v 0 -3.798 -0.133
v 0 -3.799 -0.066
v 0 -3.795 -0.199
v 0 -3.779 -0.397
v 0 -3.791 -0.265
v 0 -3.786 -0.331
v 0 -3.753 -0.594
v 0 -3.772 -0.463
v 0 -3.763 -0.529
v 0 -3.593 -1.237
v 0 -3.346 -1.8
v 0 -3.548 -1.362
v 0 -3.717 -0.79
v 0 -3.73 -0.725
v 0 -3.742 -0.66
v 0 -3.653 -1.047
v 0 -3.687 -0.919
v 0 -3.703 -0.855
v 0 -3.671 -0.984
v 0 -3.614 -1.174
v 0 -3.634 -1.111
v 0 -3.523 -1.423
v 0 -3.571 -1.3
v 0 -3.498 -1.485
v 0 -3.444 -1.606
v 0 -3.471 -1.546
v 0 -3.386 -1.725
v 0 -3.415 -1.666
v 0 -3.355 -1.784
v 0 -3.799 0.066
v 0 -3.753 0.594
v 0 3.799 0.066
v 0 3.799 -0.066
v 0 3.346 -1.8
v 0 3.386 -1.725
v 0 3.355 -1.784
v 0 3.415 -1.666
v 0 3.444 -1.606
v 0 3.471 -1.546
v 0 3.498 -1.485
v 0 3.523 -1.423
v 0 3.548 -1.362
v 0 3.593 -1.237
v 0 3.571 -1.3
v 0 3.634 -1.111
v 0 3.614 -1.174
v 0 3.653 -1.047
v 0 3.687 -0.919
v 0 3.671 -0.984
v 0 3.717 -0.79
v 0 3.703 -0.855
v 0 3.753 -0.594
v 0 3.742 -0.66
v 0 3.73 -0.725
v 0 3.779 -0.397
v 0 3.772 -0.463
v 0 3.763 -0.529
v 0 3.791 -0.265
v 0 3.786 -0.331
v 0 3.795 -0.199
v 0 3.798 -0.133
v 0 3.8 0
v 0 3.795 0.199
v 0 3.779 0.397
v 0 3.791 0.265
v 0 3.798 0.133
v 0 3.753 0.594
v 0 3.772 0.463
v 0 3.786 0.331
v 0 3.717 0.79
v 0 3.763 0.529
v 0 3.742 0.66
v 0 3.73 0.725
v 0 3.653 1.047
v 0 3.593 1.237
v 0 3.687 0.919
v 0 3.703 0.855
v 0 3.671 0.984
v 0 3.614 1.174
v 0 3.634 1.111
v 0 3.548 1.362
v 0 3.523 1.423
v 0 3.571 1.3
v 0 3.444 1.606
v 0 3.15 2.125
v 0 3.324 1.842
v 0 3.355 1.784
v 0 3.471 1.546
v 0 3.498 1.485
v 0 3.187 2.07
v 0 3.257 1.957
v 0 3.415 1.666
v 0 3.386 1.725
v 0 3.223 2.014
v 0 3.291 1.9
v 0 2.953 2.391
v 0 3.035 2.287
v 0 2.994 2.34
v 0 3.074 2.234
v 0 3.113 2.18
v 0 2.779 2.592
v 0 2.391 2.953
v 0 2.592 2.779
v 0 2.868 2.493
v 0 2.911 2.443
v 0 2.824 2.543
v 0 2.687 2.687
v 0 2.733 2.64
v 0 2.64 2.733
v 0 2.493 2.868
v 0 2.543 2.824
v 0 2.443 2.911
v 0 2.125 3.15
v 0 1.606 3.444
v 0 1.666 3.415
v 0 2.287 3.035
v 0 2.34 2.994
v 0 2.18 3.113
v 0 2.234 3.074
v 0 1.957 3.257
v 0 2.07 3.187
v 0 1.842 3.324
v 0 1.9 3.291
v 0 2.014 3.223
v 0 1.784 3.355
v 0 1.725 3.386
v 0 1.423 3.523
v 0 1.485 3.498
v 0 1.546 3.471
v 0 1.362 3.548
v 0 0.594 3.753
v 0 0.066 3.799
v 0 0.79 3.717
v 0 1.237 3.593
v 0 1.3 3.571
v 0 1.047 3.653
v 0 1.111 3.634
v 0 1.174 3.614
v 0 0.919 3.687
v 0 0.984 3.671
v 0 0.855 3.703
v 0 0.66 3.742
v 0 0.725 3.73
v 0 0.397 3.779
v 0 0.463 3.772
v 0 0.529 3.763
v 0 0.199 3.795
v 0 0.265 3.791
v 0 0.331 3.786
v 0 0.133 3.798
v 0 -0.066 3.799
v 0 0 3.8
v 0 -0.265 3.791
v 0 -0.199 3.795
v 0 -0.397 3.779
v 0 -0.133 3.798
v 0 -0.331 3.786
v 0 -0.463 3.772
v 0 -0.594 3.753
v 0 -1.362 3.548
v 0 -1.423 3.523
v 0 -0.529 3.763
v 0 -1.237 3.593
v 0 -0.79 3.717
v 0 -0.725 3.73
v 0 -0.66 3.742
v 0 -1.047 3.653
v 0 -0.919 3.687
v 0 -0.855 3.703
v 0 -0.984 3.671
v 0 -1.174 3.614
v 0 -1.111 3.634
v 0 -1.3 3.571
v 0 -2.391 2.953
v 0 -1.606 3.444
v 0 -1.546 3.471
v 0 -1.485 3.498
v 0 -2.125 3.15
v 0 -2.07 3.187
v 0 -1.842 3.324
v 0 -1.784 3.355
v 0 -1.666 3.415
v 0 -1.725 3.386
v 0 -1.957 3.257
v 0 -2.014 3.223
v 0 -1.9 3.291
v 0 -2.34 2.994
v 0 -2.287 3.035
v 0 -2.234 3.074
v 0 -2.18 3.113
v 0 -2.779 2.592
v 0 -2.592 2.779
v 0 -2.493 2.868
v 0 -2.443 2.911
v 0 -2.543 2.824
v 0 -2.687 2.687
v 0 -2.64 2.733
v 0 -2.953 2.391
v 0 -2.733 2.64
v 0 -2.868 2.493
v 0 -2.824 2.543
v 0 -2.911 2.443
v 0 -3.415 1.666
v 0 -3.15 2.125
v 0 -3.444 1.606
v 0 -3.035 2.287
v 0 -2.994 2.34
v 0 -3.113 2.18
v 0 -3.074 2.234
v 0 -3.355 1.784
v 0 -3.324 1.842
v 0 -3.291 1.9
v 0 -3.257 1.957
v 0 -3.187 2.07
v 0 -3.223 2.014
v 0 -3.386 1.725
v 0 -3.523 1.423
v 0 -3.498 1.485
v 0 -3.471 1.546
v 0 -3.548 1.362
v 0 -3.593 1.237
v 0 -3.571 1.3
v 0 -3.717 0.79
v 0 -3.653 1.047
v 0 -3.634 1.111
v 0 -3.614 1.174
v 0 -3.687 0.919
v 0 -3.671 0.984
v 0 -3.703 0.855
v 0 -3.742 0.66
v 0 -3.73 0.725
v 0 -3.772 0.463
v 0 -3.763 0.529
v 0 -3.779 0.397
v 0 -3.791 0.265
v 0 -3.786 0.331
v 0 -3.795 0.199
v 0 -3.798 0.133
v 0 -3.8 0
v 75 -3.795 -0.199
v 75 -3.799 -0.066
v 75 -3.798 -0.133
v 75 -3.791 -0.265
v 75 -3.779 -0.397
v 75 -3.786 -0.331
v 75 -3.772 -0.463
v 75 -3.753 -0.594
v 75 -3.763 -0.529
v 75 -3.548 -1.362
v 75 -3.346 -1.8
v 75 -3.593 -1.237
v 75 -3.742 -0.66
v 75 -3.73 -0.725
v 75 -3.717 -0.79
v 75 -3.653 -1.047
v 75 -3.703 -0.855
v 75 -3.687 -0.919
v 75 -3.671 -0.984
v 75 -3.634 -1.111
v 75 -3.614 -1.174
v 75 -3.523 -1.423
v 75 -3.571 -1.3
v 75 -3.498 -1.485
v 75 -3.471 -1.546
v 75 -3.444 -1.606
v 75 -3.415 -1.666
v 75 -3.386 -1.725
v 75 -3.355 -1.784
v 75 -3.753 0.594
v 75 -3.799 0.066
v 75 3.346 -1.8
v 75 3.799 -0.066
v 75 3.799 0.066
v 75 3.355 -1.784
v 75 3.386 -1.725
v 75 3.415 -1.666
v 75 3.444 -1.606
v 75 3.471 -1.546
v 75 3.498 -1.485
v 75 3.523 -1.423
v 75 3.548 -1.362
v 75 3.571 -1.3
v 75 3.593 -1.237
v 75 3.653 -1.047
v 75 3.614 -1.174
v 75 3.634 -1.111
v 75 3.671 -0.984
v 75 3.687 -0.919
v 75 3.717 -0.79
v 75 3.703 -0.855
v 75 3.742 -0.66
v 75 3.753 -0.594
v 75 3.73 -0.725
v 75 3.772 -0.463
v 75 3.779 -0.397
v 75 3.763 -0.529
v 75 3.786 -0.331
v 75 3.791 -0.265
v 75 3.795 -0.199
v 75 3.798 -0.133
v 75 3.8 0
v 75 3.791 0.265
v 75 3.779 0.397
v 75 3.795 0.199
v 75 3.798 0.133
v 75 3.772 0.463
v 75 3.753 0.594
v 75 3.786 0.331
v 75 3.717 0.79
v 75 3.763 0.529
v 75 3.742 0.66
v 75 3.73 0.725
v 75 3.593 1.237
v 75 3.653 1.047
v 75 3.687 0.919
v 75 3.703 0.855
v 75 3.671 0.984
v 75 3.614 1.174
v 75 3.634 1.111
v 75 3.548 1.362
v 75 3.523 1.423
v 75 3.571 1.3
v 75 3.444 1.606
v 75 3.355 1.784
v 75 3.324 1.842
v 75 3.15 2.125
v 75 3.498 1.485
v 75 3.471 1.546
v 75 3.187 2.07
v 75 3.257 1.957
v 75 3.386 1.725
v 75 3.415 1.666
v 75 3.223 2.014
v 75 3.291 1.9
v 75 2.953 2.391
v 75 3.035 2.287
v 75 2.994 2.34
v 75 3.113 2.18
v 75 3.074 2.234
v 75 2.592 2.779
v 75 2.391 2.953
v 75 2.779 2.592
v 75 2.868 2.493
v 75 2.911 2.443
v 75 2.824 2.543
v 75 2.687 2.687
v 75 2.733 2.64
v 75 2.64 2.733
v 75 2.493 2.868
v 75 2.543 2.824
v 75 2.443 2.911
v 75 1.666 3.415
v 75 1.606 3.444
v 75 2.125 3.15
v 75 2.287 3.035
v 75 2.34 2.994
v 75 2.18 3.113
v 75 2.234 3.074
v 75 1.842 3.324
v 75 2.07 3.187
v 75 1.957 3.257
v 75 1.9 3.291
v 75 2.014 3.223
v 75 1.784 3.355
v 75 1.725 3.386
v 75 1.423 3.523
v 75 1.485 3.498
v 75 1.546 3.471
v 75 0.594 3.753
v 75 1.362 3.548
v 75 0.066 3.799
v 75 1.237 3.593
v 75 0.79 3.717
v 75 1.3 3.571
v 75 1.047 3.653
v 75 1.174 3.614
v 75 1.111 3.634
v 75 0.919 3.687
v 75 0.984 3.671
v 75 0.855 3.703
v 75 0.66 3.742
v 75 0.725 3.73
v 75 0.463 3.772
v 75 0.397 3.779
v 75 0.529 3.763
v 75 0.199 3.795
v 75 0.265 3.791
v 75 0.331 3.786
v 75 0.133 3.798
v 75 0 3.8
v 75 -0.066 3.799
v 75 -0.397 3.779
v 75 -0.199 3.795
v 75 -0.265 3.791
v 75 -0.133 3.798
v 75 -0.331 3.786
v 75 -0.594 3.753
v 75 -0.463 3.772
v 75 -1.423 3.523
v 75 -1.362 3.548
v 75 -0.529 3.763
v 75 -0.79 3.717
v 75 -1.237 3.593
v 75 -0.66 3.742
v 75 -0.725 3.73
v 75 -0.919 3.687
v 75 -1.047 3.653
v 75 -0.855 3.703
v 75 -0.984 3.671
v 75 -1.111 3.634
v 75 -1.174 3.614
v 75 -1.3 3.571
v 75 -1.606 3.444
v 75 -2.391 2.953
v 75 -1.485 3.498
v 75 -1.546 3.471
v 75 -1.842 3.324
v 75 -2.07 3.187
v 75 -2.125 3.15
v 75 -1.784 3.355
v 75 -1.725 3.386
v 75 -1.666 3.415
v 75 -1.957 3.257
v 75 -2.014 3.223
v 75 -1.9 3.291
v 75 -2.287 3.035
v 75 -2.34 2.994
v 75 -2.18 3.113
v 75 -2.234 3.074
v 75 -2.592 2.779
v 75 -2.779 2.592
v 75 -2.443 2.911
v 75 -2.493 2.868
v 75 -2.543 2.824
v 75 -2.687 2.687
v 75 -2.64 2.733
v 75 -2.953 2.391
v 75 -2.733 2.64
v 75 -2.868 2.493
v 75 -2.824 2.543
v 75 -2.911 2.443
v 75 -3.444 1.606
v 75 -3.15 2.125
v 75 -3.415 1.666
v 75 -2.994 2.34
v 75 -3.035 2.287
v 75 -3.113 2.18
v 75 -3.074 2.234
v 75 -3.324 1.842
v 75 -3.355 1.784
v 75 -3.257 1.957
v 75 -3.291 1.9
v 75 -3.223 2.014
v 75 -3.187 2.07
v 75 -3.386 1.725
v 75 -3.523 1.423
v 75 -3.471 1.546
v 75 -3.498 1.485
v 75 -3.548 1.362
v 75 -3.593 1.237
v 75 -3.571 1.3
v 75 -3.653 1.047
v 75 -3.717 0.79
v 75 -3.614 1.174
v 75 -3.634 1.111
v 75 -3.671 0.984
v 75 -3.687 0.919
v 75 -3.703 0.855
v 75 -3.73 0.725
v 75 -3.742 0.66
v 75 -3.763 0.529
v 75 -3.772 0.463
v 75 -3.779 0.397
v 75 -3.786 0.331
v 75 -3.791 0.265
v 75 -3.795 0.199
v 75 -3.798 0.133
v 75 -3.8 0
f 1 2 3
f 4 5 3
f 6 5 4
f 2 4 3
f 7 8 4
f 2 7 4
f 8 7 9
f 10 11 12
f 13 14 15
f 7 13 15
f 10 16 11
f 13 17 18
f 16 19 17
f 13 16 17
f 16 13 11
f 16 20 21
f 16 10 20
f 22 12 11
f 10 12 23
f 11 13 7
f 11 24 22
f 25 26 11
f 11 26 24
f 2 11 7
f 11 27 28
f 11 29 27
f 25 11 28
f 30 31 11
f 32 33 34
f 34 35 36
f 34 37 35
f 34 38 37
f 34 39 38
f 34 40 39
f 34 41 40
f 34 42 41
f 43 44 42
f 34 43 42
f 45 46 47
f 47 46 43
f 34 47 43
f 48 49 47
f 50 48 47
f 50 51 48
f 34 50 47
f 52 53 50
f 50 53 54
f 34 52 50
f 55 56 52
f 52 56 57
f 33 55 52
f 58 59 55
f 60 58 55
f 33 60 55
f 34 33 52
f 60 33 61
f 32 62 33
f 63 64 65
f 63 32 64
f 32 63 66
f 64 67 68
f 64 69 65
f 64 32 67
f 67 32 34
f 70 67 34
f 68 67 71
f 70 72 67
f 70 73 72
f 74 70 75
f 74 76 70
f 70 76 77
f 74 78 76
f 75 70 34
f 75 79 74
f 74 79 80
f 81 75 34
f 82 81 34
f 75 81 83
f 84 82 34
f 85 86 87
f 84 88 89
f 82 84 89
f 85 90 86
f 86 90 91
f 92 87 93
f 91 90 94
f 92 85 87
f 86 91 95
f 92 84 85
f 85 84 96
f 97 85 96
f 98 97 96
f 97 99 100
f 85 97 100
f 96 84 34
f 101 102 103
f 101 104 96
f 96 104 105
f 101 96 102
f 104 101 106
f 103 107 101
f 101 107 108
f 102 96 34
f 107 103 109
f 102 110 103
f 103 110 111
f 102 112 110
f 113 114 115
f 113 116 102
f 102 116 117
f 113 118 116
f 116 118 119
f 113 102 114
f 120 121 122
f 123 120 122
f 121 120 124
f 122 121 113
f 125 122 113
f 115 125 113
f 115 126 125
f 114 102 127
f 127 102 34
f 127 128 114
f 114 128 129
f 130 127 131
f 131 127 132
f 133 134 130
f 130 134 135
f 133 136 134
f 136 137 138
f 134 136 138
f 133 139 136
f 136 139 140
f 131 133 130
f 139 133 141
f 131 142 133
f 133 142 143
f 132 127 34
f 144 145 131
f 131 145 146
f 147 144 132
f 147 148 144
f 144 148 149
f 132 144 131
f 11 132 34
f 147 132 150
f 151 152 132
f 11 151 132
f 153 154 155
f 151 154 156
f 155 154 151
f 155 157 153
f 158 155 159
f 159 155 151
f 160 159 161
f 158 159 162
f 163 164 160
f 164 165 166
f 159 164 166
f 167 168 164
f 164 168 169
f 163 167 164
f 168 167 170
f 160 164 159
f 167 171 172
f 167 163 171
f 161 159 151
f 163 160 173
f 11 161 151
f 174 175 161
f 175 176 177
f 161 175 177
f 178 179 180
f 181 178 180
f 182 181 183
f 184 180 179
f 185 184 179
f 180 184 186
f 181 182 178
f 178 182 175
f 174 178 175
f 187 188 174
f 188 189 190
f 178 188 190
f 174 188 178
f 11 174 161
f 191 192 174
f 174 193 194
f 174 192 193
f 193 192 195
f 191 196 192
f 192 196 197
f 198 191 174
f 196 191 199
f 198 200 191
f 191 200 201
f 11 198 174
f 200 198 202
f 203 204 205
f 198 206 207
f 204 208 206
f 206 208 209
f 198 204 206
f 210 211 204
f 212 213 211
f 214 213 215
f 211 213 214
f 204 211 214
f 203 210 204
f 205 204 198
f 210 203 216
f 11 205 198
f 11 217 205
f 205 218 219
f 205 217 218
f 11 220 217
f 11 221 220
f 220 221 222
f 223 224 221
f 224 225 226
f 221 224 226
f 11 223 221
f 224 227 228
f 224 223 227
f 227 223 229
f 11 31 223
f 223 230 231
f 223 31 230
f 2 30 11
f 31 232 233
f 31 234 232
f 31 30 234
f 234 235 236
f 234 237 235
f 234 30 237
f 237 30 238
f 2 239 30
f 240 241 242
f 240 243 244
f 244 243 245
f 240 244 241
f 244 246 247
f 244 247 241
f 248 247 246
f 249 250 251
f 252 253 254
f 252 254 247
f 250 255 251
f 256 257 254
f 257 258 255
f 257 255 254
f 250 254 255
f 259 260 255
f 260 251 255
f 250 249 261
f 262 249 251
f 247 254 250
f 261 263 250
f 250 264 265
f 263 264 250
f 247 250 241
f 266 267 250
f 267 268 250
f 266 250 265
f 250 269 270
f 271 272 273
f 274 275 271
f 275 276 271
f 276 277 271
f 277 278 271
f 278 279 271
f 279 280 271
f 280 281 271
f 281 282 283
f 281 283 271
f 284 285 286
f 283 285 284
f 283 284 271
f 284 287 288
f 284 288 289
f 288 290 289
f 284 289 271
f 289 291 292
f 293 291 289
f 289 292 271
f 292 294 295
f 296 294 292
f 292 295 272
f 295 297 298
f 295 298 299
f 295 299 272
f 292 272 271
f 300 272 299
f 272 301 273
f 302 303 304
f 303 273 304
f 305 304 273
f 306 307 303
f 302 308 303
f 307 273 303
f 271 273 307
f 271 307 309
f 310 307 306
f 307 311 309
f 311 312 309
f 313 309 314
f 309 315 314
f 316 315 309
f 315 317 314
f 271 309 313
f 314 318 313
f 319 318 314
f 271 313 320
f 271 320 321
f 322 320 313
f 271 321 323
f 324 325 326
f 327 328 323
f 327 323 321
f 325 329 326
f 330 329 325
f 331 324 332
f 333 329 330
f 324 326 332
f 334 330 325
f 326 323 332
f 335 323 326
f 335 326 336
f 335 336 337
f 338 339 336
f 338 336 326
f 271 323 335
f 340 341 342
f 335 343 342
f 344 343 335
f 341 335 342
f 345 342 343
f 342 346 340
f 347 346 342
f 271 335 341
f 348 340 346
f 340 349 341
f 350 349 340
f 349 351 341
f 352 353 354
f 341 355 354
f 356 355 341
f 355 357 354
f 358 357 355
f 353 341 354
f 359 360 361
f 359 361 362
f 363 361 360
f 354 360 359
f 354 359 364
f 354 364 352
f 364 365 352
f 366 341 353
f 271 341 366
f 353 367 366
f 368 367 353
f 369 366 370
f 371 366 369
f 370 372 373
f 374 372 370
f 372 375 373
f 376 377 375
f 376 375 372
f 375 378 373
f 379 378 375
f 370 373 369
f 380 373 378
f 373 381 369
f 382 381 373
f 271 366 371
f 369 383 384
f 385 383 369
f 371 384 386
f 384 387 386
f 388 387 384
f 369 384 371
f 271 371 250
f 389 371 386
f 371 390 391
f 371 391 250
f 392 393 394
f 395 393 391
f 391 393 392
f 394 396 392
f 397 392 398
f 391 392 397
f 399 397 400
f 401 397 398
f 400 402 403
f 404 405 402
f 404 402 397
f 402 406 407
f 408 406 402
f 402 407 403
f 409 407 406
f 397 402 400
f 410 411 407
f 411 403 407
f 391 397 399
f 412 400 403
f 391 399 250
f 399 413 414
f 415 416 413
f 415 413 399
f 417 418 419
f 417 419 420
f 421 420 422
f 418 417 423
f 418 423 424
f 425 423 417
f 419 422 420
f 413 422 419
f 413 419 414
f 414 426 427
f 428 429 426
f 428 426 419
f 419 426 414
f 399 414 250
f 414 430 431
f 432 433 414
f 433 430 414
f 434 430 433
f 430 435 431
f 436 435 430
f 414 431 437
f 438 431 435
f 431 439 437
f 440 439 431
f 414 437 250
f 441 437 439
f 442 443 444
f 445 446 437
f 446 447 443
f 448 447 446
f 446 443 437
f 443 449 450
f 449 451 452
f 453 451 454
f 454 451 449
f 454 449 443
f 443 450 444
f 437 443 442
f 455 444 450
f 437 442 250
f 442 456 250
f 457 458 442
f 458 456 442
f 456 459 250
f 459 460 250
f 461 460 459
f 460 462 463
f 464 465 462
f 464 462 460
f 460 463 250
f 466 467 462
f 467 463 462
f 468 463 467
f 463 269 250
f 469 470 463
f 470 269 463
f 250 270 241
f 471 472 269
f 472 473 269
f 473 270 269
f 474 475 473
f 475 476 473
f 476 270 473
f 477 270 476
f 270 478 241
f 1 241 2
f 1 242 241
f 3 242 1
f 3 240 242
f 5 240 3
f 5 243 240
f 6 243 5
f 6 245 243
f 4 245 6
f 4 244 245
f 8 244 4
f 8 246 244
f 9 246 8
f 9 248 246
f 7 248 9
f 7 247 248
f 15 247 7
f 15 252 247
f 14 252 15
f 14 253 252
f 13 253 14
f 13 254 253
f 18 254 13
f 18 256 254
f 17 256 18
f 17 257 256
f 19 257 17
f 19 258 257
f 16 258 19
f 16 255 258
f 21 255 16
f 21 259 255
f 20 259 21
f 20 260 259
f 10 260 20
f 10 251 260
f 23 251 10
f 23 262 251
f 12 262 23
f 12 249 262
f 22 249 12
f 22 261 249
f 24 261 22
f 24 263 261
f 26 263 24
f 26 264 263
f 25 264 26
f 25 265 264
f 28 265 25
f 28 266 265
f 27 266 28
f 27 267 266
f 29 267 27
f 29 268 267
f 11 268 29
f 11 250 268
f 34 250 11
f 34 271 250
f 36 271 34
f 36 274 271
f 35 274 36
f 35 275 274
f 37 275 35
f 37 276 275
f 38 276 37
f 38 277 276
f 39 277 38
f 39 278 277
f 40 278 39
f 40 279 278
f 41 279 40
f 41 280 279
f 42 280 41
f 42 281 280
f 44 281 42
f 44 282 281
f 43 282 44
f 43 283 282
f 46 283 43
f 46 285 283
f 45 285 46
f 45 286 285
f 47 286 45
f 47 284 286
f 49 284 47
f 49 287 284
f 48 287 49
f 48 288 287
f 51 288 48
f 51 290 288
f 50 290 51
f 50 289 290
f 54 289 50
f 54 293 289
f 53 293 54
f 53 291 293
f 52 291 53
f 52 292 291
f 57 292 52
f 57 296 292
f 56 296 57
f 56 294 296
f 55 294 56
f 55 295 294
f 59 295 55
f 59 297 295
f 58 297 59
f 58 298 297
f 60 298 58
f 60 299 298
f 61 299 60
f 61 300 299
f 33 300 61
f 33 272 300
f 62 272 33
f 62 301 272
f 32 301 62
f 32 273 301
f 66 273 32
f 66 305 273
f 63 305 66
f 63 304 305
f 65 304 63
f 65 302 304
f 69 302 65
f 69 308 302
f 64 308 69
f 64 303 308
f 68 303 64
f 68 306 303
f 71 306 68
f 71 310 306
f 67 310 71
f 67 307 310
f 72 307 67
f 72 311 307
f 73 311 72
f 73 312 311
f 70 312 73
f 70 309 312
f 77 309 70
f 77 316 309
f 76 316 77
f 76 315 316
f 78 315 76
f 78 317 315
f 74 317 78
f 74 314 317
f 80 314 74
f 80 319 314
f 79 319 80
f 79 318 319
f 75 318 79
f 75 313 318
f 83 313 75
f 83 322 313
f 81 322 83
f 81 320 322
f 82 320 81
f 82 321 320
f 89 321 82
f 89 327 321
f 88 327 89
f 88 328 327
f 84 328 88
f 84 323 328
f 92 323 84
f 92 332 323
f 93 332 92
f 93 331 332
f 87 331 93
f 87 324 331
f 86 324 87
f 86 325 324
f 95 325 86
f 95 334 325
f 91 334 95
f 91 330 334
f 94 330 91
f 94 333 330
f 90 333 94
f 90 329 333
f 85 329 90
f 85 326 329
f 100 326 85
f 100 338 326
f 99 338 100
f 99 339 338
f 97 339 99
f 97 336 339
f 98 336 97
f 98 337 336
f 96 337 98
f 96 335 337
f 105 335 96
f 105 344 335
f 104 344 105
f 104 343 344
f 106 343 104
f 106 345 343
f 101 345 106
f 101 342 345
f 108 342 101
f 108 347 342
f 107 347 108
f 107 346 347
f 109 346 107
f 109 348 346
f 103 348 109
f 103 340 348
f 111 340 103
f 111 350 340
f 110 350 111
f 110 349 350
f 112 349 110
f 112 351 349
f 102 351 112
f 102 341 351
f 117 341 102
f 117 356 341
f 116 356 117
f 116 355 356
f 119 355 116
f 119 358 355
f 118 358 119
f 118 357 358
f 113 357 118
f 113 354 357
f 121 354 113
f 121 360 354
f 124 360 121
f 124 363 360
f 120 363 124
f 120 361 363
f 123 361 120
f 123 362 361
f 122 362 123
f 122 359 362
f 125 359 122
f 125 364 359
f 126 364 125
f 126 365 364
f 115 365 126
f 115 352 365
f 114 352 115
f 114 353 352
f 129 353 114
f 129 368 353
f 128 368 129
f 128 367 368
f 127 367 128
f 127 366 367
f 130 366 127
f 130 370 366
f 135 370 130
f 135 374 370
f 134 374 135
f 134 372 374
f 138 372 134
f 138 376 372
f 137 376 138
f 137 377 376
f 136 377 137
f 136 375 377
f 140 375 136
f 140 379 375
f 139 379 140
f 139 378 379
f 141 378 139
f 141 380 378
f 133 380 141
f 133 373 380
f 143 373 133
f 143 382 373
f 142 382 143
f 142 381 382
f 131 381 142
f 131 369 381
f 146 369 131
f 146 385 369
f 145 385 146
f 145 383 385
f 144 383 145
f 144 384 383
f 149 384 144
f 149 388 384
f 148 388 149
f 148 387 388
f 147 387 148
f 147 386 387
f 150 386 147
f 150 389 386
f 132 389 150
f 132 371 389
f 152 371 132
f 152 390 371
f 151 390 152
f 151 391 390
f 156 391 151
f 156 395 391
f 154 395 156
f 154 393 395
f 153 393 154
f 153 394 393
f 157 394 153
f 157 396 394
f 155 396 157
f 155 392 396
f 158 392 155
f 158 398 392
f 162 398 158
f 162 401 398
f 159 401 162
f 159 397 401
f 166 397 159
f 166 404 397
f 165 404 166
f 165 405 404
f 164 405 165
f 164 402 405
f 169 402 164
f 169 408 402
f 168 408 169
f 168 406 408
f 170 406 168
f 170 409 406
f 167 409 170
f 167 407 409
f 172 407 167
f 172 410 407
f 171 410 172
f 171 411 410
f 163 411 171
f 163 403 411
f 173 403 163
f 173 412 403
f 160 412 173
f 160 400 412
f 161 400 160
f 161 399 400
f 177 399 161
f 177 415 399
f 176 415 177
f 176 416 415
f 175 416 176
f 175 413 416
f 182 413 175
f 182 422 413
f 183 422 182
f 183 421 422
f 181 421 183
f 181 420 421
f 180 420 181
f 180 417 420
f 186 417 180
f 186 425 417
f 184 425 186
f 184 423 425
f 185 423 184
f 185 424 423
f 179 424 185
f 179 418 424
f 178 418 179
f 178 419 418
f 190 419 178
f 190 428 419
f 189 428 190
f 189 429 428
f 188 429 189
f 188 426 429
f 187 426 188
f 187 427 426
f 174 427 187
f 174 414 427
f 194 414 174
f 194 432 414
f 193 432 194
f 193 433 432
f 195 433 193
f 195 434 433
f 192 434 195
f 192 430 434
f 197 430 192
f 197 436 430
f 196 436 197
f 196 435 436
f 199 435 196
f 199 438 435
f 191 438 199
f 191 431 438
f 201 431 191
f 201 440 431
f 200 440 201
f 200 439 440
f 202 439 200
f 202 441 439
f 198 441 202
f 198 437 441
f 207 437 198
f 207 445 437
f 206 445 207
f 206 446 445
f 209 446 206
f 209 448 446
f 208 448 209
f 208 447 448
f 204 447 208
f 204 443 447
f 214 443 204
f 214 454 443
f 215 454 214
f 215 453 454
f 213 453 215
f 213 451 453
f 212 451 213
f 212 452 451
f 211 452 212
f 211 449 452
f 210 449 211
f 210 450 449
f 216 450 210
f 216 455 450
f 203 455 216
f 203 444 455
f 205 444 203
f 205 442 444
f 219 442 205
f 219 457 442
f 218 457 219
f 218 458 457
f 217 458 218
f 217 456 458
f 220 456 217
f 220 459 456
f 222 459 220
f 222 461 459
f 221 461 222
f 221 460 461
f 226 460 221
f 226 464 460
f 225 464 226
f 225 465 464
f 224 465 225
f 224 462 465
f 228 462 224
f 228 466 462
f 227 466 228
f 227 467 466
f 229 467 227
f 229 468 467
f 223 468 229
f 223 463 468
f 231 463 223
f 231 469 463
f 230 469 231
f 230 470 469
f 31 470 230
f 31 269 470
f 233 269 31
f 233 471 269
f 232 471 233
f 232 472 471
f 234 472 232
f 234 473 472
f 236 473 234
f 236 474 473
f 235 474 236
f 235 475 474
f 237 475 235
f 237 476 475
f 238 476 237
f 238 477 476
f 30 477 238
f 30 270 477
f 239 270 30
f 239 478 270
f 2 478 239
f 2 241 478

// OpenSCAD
$fn = 360;
shaftLen = 75.0;
shaftDia = 7.60;
flatOffset = 1.8;

rotate ([0, 90, 0]) {
  linear_extrude (shaftLen) {
    difference () {
      circle (d = shaftDia);
      
      translate ([flatOffset, -(shaftDia / 2), 0])
        square ([shaftDia, shaftDia]);
    }
  }
}
